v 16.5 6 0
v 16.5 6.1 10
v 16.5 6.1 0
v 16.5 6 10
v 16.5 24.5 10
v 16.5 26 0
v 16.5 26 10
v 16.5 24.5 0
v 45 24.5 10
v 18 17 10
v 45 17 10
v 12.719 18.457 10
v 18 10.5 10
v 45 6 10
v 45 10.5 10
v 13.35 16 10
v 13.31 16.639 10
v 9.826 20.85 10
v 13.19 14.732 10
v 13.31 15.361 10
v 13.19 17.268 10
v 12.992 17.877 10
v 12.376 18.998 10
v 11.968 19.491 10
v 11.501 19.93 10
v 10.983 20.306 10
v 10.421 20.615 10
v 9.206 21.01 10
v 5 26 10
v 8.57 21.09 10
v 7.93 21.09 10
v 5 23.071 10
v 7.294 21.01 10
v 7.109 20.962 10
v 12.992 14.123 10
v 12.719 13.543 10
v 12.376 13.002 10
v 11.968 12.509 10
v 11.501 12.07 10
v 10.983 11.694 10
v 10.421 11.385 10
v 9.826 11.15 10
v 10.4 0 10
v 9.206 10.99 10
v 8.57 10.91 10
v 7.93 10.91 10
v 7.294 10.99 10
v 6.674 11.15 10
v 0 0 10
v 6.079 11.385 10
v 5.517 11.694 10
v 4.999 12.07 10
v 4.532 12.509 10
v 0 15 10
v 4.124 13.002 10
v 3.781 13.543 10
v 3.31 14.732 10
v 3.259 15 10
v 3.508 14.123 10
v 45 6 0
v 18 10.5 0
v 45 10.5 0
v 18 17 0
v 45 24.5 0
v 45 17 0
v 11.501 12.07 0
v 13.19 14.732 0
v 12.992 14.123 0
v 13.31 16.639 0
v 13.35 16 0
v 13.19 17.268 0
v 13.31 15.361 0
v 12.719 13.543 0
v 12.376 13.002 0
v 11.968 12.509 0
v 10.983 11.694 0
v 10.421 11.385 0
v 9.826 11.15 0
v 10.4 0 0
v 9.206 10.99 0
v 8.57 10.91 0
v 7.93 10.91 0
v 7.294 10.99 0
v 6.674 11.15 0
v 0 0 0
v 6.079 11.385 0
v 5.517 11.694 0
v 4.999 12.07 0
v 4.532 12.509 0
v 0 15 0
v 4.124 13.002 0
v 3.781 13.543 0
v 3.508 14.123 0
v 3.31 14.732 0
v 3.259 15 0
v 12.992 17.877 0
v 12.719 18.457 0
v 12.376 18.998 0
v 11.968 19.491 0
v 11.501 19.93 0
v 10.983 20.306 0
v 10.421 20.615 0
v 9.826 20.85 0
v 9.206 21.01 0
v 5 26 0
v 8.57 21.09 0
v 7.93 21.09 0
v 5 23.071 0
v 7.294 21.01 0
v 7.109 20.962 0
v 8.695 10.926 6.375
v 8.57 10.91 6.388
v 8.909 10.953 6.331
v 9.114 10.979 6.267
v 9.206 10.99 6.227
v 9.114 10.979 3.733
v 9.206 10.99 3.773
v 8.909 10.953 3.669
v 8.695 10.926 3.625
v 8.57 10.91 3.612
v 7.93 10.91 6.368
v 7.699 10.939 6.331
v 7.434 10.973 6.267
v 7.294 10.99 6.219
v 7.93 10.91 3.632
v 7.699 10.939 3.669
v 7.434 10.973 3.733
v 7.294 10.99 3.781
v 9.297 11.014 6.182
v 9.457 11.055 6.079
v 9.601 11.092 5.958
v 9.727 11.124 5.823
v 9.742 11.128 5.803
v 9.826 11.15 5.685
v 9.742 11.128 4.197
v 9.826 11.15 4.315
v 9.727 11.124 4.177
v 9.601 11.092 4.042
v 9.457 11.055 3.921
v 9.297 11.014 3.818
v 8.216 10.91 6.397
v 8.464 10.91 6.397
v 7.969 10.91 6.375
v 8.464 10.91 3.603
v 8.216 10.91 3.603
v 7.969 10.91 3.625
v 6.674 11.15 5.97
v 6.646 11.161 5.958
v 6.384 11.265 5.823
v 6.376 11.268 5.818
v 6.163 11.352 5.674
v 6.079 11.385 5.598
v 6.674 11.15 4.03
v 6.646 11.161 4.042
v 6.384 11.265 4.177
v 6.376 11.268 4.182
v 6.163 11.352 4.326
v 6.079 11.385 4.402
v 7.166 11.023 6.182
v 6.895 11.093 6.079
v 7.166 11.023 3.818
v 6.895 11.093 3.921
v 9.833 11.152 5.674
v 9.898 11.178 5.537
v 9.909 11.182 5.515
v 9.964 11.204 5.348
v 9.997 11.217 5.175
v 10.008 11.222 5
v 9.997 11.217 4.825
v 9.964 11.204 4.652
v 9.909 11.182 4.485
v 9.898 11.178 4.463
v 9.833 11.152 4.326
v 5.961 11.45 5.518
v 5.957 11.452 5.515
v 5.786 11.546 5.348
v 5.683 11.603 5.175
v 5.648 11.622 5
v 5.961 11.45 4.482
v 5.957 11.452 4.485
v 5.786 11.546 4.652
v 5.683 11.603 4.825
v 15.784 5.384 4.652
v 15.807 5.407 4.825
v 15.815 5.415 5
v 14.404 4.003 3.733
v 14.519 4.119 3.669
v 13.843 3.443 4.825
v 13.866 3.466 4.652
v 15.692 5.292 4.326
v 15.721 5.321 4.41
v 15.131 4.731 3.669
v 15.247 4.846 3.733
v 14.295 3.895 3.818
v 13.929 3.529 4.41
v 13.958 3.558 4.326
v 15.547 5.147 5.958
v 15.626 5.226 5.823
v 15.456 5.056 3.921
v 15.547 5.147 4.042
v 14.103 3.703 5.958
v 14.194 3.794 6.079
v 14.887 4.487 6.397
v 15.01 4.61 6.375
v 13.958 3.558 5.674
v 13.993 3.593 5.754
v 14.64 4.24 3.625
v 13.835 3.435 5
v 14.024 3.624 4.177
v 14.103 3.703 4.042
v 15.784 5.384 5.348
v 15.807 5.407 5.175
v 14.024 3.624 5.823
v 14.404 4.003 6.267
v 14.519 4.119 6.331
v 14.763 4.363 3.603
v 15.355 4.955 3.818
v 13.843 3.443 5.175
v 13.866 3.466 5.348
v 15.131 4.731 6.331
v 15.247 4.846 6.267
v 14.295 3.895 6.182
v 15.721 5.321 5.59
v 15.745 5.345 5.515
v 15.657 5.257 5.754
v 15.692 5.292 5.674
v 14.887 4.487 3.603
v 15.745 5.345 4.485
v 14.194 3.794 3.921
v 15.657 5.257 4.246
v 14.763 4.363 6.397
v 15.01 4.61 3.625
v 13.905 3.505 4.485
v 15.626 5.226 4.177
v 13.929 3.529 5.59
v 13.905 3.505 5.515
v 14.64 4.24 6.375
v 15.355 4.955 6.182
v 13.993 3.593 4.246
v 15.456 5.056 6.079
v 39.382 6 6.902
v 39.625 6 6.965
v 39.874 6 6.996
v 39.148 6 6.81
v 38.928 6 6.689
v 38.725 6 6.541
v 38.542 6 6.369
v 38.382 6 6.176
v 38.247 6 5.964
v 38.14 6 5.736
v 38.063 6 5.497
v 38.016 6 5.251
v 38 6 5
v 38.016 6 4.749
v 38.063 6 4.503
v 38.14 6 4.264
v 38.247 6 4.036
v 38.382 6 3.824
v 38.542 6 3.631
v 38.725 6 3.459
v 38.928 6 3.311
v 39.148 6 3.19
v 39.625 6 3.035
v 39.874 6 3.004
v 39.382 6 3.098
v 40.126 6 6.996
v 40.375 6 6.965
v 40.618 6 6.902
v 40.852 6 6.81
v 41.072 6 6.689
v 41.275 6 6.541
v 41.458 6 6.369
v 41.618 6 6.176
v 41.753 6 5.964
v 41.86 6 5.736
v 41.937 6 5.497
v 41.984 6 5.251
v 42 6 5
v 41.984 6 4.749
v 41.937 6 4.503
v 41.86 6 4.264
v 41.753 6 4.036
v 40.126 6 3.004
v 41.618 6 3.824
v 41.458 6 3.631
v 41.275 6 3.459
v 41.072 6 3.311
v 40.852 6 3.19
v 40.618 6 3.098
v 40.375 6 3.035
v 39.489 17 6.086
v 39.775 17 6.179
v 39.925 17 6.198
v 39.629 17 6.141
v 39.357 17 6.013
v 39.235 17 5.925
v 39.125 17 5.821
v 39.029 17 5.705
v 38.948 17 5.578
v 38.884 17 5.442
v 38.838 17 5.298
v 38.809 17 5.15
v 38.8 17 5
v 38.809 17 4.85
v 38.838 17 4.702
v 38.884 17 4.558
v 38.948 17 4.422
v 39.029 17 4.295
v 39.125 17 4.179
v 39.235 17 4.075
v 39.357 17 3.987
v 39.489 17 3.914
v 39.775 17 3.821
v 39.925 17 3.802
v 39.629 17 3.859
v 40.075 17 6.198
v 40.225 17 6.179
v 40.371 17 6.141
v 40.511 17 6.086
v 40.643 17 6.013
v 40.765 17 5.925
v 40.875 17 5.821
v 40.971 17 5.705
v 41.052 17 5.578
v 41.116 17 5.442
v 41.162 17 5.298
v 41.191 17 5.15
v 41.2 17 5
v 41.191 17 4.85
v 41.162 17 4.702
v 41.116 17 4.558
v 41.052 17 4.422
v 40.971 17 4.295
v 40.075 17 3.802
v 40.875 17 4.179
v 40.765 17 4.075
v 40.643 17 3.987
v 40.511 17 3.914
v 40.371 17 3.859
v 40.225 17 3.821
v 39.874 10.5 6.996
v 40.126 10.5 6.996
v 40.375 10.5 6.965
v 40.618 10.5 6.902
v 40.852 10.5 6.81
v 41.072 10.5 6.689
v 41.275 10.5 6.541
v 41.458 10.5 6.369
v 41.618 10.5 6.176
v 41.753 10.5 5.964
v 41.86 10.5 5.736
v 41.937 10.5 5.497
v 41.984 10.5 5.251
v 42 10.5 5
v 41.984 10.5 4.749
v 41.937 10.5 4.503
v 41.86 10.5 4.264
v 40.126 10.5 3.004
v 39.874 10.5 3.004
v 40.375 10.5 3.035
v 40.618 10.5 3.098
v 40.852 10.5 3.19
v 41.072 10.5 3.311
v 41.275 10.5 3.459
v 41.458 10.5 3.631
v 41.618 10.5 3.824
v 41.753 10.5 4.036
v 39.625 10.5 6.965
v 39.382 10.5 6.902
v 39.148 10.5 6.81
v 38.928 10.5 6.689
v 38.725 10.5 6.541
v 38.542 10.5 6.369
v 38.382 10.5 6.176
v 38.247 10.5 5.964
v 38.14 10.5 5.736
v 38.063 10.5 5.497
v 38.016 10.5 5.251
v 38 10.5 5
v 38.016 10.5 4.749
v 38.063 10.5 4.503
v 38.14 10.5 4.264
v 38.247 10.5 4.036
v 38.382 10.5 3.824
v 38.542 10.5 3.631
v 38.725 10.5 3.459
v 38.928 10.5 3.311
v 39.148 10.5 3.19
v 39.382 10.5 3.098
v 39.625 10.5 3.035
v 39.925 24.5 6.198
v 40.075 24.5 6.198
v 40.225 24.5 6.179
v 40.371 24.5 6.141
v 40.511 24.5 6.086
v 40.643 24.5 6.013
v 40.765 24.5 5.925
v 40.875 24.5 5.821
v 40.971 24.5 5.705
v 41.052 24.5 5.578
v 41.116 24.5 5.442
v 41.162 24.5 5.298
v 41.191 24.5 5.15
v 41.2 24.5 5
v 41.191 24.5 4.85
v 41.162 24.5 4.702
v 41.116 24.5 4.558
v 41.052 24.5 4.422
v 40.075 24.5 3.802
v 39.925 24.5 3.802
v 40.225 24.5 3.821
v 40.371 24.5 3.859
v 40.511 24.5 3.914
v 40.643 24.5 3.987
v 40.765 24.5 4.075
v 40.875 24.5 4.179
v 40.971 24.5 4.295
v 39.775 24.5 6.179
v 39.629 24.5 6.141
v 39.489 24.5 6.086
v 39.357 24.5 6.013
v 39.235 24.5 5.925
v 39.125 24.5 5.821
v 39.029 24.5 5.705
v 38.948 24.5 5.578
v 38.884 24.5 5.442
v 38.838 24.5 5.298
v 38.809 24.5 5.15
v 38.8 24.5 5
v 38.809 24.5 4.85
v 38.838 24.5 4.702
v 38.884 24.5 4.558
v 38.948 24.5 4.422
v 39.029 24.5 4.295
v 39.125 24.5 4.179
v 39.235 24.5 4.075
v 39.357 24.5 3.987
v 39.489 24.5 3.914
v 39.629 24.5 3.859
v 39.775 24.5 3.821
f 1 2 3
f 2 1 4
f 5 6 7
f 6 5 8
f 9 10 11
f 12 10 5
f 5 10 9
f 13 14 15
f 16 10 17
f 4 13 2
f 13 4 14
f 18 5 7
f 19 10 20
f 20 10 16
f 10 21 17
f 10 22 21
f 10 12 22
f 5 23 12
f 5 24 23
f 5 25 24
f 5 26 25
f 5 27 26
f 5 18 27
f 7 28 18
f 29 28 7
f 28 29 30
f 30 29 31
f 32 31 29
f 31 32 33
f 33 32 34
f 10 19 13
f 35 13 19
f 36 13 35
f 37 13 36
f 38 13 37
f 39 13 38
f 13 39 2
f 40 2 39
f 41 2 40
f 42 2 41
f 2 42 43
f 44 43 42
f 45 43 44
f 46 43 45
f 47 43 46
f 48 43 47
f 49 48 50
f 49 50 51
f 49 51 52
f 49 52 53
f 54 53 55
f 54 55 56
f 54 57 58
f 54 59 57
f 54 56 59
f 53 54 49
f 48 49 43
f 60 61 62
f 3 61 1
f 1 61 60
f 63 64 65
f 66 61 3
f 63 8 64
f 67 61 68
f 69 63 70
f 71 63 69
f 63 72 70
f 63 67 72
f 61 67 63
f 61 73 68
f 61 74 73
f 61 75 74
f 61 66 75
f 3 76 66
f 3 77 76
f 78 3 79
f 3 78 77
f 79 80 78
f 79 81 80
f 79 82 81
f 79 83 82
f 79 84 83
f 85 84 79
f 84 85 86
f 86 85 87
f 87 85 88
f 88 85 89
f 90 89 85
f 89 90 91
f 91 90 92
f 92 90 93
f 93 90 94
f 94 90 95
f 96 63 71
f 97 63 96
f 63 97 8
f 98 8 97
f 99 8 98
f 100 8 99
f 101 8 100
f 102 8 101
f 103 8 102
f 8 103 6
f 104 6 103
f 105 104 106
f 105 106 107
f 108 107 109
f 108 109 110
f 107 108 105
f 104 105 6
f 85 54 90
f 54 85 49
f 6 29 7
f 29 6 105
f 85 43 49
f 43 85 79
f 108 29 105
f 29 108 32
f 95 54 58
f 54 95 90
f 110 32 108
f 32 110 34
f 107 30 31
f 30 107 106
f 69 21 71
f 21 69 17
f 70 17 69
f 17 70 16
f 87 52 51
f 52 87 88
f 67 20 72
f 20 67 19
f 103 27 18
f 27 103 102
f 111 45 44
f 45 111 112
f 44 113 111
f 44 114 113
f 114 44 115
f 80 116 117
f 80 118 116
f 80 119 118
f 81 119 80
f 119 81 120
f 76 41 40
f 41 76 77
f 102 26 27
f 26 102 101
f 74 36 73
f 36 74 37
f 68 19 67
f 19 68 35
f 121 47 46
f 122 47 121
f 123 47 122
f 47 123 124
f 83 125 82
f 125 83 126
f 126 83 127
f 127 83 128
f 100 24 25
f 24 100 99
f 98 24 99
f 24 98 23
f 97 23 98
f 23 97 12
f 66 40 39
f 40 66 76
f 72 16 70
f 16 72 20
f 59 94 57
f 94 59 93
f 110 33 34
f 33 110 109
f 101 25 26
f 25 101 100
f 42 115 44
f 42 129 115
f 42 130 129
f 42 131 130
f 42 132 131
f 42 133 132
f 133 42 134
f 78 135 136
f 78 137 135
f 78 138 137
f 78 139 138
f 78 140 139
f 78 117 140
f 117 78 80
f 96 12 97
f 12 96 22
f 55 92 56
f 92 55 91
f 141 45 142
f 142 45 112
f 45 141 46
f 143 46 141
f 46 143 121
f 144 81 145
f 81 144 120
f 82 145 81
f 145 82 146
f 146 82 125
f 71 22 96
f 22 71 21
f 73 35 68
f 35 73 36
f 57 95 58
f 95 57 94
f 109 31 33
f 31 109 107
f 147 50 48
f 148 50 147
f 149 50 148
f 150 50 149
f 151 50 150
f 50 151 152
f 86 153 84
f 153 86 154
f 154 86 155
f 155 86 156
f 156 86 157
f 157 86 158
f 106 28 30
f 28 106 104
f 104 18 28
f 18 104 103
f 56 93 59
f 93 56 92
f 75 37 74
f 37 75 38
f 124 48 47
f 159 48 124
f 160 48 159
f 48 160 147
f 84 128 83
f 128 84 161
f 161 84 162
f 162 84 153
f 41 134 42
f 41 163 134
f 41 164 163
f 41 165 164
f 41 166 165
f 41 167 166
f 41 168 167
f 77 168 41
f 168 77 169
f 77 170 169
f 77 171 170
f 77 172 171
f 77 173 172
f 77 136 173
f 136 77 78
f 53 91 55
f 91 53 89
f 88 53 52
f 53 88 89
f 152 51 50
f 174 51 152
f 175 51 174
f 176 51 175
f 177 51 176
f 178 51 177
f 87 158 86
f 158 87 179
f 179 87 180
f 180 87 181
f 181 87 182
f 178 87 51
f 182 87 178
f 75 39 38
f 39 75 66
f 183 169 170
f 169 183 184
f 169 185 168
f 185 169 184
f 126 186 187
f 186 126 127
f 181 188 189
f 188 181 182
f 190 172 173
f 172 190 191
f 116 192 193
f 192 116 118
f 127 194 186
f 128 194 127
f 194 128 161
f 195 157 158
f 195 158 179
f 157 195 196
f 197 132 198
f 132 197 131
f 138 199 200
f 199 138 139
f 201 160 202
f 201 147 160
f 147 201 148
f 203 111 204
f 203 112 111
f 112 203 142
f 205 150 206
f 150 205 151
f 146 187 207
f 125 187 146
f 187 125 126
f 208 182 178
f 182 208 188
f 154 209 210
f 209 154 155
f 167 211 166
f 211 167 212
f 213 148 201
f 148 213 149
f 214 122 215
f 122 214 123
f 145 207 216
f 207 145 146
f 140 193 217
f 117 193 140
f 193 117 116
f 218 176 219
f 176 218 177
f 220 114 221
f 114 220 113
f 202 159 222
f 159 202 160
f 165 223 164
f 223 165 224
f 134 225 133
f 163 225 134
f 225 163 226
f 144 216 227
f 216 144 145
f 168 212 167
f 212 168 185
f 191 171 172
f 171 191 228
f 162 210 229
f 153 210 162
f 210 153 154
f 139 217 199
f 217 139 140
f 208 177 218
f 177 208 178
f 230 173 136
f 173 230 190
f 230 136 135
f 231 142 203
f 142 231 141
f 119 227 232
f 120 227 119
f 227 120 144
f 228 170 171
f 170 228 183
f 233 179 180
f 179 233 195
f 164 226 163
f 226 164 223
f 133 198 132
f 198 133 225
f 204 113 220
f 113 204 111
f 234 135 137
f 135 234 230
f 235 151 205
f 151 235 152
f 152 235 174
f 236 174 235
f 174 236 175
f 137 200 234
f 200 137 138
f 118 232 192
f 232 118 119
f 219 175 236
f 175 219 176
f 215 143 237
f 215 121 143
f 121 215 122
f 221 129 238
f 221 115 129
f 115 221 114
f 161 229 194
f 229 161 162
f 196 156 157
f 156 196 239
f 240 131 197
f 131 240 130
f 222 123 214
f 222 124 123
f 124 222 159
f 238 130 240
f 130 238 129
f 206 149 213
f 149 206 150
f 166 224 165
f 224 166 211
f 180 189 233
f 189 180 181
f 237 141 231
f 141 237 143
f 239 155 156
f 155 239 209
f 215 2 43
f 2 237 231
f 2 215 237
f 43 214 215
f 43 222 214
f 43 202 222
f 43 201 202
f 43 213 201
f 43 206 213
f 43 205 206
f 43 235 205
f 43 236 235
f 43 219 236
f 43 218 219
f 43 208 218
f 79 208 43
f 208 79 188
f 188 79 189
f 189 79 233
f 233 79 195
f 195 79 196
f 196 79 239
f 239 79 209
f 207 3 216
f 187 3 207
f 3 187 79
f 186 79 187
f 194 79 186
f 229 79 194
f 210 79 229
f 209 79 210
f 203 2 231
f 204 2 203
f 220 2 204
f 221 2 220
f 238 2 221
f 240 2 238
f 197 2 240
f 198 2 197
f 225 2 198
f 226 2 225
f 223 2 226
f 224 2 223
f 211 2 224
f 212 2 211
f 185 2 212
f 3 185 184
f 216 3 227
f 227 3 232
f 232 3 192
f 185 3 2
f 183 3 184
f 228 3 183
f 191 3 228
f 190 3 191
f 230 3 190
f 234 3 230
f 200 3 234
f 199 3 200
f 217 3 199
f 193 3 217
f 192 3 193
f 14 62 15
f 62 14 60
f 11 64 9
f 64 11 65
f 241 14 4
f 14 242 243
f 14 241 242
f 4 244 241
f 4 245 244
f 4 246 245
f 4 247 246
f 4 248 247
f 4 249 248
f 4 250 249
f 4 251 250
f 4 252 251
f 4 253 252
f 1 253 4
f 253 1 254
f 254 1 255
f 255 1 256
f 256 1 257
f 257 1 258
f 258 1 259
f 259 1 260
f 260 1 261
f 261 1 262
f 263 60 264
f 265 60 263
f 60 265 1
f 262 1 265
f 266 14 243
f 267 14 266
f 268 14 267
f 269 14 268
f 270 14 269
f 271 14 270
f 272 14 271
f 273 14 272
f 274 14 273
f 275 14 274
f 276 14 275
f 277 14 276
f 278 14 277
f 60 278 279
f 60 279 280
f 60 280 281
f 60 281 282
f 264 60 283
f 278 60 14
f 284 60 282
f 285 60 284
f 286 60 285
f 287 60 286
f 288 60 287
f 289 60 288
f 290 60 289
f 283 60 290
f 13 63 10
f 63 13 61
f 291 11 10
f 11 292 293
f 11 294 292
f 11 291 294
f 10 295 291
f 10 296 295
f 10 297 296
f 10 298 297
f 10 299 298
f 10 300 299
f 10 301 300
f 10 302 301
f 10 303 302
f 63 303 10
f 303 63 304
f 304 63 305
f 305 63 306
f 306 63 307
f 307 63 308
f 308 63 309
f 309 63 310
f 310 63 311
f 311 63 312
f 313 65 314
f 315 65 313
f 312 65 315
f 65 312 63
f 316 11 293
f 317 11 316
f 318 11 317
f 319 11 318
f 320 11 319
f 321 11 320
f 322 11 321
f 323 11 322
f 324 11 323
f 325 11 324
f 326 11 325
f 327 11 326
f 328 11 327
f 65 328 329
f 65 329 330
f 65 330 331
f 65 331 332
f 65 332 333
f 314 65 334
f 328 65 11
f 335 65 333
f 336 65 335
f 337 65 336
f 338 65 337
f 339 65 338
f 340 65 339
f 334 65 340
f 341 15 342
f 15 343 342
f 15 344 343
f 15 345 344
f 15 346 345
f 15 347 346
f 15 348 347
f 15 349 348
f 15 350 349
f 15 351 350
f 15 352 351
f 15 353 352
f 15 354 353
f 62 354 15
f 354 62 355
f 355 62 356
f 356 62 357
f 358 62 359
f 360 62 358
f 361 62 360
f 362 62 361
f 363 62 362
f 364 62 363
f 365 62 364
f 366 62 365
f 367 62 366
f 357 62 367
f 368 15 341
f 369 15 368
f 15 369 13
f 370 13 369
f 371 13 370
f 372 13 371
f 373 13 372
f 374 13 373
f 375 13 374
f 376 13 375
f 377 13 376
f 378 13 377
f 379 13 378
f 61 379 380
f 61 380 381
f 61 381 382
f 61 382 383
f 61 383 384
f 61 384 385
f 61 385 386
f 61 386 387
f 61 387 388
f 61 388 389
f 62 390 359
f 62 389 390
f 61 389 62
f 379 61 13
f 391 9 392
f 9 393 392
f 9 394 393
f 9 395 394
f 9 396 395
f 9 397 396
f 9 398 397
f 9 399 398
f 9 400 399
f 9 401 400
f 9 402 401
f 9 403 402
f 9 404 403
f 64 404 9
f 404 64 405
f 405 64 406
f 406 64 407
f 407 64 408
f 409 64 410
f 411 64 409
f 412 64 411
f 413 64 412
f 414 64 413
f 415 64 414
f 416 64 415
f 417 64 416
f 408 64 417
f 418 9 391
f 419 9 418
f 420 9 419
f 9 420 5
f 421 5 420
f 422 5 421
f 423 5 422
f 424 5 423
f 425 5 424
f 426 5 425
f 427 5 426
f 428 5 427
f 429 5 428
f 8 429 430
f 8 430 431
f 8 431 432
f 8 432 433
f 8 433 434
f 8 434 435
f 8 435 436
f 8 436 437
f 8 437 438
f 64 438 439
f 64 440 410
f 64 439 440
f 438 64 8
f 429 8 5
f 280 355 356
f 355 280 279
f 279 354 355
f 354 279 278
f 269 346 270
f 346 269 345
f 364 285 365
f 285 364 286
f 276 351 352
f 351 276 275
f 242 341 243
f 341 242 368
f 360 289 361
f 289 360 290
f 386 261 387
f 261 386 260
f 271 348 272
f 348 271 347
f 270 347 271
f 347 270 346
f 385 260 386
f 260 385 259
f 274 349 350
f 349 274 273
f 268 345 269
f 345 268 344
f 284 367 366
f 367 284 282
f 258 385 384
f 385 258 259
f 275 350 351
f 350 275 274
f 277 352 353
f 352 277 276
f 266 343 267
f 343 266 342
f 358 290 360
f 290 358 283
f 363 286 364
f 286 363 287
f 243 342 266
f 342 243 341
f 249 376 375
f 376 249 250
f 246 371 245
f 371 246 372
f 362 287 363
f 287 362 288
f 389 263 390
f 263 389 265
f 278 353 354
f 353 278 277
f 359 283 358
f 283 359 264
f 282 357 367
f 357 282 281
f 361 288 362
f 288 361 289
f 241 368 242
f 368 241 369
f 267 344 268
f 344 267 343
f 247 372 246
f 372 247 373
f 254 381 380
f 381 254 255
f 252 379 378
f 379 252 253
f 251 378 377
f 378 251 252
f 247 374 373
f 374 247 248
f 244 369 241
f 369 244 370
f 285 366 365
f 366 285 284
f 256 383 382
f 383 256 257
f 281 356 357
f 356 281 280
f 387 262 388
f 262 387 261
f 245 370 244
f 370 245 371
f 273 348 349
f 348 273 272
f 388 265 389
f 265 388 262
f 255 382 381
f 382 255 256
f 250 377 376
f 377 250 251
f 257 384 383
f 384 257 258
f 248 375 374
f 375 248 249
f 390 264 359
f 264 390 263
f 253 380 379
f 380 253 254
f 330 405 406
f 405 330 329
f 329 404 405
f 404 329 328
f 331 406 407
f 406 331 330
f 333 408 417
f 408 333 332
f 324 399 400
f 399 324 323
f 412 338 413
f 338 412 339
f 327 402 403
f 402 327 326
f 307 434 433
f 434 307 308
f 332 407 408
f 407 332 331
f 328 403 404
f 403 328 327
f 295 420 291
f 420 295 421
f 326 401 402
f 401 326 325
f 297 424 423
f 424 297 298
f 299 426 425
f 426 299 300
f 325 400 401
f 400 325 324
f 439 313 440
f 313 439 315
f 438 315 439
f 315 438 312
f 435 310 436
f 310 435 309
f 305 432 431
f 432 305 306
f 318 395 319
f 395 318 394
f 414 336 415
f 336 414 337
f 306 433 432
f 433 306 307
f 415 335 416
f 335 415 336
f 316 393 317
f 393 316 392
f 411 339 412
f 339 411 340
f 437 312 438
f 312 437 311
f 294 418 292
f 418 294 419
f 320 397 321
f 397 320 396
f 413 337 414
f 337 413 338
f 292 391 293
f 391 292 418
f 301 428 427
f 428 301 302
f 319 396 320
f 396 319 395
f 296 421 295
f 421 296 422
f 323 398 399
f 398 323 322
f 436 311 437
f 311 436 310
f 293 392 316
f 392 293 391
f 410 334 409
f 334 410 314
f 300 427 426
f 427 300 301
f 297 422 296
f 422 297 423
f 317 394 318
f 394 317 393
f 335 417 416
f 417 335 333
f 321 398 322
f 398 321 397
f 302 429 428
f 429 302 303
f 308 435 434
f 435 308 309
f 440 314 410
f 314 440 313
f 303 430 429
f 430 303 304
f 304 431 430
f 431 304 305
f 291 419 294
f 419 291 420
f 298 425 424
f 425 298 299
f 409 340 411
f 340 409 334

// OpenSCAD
r_arbre=5.1;
l_bloc=26;
ep_bloc_base=16.5;
r_m3_for=1.4;
r_m3=2;
r_ecrou_m3=3.3;
pos_vis=19;
hauteur=10;

longueur=29;

module bloc_profile(){
	difference(){
		cube([ep_bloc_base,l_bloc,hauteur]);

		//petite extrusion pour passage à l'intérieur du profilé
		translate([-5,15,-5]){cube([10,25,hauteur+10]);}
		translate([5,16,-5]){rotate([0,0,45])cube([5,6,hauteur+10]);}

		//trou général sur le profilé
		translate([ep_bloc_base/2,16,-5]){cylinder(h=hauteur+10, r=r_arbre, $fn=50);}

		//trou pour blocage de la vis
		translate([ep_bloc_base/2+16,-5,hauteur/2]){rotate([-90,0,45])cylinder(h=25, r=r_m3_for, $fn=50);}

		//cassage coin
		translate([10.4,0,-5]){rotate([0,0,-45])cube([7,9,hauteur+10]);}
	
	}
	
}

module support_endstop(){
	difference(){
		cube([28.5,longueur,hauteur]);
		
		translate([1.5,4.5,-5]){cube([30,6.5,hauteur+10]);}
		translate([0,18.5,-5]){cube([35,20,hauteur+10]);}

		//trou pour serrage contact de fin de course
		translate([23.5,-5,hauteur/2]){rotate([-90,0,0])cylinder(h=hauteur, r=r_m3, $fn=50);}
		translate([23.5,10,hauteur/2]){rotate([-90,0,0])cylinder(h=hauteur, r=1.2, $fn=50);}
	}

}

bloc_profile();
translate([ep_bloc_base,6,0]){support_endstop();}
